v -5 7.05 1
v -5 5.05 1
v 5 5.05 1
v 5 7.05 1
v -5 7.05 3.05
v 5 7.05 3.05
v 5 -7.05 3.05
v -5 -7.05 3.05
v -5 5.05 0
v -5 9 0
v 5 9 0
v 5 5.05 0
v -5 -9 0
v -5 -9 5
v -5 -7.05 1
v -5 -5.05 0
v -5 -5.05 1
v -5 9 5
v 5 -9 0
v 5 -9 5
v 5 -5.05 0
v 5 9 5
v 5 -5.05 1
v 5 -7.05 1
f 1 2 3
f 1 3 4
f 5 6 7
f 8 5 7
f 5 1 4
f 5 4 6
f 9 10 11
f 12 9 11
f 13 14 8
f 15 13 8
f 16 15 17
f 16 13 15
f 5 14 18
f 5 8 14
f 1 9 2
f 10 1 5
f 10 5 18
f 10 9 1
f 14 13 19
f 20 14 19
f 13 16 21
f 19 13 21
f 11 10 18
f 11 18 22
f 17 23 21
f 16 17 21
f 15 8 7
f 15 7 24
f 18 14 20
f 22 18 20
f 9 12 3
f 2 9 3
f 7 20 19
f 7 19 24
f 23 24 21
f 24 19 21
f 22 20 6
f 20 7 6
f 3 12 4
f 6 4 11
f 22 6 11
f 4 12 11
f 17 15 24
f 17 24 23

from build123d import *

# Parameters (mm, degrees)
F0_W     = 10
F0_H     = 18
F1_DEPTH = 5
F3_DEPTH = 10.001


with BuildPart() as f1:
    # F0 (on Top) → F1 (new body)
    with BuildSketch(Plane.XY):
        Rectangle(F0_W, F0_H)
    extrude(amount=F1_DEPTH)

    # F2 (on face) → F3 (cut, through all)
    with BuildSketch(Plane.YZ.offset(5)):
        Polygon((-5.05, 1), (-5.05, 0), (5.05, 0), (5.05, 1), (7.05, 1), (7.05, 3.05), (-7.05, 3.05), (-7.05, 1), align=None)
    extrude(amount=-F3_DEPTH, mode=Mode.SUBTRACT)


solid = f1.part
